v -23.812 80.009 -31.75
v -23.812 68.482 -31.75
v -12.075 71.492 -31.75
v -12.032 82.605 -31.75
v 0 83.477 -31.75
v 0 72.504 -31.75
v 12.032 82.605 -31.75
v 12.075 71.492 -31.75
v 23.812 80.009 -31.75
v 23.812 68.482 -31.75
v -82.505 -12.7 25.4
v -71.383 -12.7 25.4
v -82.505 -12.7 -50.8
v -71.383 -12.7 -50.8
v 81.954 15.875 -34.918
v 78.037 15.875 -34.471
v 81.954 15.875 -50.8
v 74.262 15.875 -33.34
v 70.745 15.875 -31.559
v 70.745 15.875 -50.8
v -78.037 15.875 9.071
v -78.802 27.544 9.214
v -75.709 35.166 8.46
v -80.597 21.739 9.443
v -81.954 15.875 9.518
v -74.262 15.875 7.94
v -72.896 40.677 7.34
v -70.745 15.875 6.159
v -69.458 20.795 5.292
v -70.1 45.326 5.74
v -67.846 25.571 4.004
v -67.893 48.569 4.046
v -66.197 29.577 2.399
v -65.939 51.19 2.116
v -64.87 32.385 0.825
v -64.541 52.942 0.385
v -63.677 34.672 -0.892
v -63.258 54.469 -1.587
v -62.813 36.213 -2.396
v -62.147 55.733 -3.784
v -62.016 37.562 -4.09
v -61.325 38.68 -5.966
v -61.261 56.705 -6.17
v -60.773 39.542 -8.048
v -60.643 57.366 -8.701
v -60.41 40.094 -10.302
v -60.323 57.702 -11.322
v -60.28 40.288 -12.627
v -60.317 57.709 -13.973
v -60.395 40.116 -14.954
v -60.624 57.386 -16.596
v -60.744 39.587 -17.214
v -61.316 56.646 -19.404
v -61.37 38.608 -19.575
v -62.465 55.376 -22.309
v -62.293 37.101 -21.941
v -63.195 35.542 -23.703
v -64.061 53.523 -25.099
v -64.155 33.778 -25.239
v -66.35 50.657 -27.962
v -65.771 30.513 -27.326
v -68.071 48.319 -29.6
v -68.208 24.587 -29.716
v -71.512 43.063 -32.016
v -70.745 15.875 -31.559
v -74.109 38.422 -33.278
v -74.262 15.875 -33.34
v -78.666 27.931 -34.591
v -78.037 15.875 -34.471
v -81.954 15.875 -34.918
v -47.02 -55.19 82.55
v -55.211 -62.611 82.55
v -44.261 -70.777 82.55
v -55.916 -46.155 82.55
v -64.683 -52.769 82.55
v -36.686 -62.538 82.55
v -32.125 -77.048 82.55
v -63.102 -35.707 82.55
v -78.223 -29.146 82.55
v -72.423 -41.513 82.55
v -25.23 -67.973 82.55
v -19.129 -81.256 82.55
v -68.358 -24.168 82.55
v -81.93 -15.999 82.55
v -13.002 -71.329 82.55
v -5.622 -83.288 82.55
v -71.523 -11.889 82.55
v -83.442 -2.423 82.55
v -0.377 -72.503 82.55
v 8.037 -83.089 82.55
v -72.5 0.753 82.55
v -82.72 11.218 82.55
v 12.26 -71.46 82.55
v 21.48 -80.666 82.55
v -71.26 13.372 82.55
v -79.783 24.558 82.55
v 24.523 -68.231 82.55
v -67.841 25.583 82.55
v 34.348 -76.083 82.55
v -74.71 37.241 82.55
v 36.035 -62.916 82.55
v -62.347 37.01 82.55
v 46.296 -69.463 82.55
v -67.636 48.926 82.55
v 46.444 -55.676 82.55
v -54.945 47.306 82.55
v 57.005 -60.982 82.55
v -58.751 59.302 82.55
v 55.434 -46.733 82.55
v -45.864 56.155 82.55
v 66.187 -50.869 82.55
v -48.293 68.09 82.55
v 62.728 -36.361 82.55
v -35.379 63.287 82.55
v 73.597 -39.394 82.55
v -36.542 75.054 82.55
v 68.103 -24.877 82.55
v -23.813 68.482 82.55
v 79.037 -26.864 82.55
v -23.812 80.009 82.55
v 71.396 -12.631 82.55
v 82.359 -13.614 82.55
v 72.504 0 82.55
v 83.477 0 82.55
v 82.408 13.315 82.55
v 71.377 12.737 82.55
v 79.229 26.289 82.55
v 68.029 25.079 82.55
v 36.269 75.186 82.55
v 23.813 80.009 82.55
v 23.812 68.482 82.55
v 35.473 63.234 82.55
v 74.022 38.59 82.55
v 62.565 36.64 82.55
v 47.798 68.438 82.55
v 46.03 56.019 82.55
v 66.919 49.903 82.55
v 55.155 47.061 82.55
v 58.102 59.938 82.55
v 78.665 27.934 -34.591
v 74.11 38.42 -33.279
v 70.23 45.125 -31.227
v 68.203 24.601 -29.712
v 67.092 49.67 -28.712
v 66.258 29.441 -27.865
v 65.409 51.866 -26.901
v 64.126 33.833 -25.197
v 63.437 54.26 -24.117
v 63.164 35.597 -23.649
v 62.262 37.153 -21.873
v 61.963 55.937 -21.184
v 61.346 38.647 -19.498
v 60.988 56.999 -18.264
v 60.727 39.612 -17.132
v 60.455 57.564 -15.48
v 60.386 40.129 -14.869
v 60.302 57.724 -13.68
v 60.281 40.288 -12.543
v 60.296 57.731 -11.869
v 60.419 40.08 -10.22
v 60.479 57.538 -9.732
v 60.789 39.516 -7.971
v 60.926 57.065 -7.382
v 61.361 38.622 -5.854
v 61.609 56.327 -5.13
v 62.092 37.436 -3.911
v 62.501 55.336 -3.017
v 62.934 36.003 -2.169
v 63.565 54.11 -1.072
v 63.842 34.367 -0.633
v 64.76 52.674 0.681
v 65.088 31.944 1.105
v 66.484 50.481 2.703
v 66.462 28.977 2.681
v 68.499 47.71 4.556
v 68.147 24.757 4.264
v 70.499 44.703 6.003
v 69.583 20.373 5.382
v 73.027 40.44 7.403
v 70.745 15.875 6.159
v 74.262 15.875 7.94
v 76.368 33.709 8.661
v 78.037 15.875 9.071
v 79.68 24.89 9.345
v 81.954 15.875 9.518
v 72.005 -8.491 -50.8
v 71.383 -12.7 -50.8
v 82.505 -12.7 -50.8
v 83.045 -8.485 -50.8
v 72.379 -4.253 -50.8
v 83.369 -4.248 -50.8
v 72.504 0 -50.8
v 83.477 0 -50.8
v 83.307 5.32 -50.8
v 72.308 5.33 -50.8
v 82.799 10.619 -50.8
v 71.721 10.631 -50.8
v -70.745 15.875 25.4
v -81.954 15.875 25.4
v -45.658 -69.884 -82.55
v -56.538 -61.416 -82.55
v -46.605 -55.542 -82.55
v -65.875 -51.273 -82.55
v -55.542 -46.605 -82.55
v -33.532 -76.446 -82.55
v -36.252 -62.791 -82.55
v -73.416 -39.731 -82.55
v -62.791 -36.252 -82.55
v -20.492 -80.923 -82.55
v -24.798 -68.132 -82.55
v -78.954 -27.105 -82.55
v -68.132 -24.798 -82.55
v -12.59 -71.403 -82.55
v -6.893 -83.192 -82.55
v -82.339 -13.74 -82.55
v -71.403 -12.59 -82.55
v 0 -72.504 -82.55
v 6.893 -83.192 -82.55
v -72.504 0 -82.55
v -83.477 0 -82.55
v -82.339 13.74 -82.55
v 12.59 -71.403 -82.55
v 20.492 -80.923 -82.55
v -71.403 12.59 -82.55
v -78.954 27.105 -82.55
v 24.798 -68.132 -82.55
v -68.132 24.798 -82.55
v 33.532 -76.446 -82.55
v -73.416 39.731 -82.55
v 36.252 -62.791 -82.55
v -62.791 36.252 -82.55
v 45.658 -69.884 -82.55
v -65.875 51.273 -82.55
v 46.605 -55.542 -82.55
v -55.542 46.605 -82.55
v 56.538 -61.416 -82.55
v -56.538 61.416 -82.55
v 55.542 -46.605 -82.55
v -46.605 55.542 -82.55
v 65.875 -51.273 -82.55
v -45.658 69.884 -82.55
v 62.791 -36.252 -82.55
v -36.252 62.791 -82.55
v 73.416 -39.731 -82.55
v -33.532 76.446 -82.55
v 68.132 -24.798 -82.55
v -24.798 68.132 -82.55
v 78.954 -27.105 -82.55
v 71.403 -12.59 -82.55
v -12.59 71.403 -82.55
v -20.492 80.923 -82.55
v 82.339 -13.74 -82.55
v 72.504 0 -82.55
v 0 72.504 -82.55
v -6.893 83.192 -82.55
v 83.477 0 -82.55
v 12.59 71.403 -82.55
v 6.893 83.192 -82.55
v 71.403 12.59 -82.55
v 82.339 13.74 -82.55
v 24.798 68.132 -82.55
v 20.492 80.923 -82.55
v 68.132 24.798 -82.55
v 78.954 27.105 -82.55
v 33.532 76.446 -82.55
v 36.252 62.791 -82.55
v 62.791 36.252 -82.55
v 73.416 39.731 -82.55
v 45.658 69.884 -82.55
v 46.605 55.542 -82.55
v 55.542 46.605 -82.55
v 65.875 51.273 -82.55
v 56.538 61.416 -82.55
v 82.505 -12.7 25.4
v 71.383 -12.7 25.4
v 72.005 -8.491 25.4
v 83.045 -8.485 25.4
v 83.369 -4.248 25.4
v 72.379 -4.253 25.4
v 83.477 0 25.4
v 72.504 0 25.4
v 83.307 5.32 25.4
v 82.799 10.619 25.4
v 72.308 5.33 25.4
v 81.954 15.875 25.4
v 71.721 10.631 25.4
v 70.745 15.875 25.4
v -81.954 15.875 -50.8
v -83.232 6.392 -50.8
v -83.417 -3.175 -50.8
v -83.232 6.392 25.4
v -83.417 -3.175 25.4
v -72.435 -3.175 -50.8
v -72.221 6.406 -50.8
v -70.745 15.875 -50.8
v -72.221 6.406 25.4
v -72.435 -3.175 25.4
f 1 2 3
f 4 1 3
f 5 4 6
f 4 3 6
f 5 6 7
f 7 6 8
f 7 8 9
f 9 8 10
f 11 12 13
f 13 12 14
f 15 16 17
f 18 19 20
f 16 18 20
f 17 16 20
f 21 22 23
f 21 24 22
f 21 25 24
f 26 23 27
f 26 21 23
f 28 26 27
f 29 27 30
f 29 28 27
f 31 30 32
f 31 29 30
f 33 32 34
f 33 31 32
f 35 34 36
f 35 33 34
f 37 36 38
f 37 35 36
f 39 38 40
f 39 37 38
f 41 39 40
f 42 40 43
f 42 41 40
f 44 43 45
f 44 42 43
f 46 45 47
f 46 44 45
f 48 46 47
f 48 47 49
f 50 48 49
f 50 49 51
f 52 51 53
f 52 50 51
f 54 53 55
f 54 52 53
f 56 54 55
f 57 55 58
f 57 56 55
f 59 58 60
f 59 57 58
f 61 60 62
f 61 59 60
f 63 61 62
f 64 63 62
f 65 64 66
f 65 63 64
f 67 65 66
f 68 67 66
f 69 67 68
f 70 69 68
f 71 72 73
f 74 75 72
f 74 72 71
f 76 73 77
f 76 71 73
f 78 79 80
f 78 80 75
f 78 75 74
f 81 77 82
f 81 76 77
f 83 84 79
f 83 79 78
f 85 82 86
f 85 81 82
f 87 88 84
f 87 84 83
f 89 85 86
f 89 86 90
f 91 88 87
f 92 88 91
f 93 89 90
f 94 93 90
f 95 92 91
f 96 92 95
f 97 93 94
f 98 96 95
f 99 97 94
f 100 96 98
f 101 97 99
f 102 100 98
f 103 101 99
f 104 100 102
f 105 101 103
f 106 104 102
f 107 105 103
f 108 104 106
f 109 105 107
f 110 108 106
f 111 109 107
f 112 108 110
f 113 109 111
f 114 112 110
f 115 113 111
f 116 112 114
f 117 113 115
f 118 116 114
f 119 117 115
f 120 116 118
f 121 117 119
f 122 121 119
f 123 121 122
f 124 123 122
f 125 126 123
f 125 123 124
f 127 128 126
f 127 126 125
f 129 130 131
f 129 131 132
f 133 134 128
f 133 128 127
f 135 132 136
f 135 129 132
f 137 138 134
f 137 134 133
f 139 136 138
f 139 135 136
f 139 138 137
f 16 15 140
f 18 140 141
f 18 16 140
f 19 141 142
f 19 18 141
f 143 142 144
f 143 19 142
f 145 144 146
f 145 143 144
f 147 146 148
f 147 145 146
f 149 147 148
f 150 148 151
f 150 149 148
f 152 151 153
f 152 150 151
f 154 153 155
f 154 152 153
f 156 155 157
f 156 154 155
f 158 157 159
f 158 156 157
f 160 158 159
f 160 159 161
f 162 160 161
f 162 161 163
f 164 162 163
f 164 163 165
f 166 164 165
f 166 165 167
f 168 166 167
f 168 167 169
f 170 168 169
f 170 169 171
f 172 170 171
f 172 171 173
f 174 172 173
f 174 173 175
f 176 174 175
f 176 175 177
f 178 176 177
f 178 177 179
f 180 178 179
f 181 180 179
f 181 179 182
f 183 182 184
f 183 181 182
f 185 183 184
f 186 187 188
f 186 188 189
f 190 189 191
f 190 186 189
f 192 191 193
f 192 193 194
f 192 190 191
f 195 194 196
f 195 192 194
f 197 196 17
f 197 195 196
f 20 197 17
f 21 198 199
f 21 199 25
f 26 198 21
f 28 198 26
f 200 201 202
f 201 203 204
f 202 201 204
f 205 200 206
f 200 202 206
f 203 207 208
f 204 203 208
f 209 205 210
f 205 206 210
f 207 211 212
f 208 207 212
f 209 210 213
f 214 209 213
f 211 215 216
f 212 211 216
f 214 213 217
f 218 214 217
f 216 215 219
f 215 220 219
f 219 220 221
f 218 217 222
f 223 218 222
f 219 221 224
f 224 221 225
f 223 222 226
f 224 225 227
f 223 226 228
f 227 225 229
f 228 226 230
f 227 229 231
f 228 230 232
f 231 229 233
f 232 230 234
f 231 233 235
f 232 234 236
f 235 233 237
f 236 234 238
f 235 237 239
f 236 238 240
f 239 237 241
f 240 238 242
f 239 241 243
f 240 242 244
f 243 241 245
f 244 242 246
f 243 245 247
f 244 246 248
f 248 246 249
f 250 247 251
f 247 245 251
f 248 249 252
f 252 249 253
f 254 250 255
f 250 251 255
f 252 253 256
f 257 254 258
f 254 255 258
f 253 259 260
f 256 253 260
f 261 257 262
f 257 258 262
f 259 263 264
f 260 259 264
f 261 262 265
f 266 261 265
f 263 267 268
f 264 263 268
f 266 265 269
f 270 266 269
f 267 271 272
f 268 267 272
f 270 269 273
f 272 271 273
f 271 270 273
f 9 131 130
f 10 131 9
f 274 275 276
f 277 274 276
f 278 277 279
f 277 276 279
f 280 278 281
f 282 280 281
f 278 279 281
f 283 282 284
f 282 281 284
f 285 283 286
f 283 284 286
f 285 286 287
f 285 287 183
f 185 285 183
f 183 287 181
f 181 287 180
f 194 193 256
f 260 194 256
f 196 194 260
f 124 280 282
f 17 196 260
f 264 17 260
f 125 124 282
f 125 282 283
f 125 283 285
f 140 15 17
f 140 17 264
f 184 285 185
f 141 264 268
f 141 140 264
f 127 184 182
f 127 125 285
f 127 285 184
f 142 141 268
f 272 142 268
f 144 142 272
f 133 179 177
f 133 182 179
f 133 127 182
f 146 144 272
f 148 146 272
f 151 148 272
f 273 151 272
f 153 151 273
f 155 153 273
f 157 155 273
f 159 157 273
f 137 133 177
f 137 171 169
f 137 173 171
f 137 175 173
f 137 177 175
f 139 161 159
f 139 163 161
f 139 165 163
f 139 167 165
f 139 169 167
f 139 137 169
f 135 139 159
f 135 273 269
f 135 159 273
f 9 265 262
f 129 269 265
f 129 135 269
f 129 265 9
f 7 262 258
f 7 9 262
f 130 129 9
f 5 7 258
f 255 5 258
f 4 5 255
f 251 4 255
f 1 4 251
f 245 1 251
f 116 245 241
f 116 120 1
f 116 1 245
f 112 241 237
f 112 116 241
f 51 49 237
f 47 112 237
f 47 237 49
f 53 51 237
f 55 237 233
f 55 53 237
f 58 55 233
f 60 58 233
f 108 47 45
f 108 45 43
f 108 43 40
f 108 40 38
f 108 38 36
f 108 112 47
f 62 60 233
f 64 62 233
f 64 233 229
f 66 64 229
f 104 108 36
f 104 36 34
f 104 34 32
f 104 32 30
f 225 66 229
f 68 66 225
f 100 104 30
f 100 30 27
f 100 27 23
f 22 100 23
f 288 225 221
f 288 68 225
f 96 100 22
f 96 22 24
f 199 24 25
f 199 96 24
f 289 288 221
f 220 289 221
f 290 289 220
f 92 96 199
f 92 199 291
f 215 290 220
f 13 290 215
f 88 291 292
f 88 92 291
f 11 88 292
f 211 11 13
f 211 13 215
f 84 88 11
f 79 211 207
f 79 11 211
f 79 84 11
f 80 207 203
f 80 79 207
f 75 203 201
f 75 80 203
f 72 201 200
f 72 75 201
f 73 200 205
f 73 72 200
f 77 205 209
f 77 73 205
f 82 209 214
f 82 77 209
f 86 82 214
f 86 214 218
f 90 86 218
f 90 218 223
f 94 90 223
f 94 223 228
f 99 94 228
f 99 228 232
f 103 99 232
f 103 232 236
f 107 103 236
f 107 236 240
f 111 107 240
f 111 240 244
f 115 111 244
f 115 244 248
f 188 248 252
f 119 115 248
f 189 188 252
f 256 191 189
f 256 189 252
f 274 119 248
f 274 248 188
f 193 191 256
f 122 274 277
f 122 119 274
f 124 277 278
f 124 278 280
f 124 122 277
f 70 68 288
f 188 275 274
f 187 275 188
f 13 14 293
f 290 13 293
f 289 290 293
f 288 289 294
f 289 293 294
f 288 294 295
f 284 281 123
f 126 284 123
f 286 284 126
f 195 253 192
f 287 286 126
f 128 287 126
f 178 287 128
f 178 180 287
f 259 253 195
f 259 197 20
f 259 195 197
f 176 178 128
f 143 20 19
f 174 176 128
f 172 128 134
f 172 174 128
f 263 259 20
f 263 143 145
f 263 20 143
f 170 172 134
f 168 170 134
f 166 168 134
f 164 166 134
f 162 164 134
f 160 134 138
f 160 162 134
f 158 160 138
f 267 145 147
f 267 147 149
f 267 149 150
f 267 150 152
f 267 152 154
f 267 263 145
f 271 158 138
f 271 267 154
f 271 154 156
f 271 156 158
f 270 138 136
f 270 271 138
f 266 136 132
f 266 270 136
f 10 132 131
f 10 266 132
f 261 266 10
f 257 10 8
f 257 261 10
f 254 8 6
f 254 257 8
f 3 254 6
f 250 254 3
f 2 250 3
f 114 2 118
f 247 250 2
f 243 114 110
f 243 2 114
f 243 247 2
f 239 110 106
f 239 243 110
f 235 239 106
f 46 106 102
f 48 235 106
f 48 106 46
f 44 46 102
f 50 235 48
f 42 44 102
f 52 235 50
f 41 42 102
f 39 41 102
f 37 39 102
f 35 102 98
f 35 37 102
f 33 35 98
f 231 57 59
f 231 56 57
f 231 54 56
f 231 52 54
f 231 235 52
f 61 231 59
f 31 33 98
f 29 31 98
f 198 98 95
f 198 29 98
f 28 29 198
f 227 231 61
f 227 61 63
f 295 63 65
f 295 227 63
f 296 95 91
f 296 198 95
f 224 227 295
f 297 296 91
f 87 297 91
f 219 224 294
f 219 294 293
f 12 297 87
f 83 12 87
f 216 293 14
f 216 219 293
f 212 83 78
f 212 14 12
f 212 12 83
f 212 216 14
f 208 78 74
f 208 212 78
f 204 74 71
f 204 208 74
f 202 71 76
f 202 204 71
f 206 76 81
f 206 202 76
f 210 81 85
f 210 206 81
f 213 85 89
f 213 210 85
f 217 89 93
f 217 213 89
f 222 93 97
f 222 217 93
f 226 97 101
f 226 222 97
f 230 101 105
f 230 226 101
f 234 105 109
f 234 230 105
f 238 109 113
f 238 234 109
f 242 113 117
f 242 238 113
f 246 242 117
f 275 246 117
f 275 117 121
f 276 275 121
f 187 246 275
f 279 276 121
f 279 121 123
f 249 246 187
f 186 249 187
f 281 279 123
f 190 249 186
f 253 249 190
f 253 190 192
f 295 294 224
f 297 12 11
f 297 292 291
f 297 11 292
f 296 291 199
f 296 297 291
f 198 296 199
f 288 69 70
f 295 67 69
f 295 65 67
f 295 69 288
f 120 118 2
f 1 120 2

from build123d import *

# Parameters (mm, degrees)
SKETCH1_R               = 83.4771
SKETCH1_R_2             = 72.5043
BOSS_EXTRUDE1_DEPTH     = 82.55
SKETCH2_W               = 47.625
SKETCH2_H               = 114.3
CUT_EXTRUDE1_DEPTH      = 84.4771
SKETCH3_W               = 76.2
SKETCH3_H               = 25.4
CUT_EXTRUDE2_DEPTH      = 84.4771
CUT_EXTRUDE2_DEPTH_BACK = 84.4771
SKETCH4_R               = 22.225
CUT_EXTRUDE3_DEPTH      = 97.1771
SKETCH6_W               = 76.2
SKETCH6_H               = 3.175
CUT_EXTRUDE4_DEPTH      = 84.4771001
CUT_EXTRUDE4_DEPTH_BACK = 84.4771001


with BuildPart() as part:
    # Sketch1 → Boss-Extrude1 (new body, symmetric)
    with BuildSketch(Plane.XY):
        Circle(SKETCH1_R)
        Circle(SKETCH1_R_2, mode=Mode.SUBTRACT)
    extrude(amount=BOSS_EXTRUDE1_DEPTH, both=True)

    # Sketch2 → Cut-Extrude1 (cut, through all)
    with BuildSketch(Plane(origin=(0, 0, 0), x_dir=(1, 0, 0), z_dir=(0, 1, 0))):
        with Locations((0, -25.4)):
            Rectangle(SKETCH2_W, SKETCH2_H)
    extrude(amount=CUT_EXTRUDE1_DEPTH, mode=Mode.SUBTRACT)

    # Sketch3 → Cut-Extrude2 (cut, two sides)
    with BuildSketch(Plane(origin=(0, 0, 0), x_dir=(0, 0, -1), z_dir=(1, 0, 0))) as cut_extrude2_sk:
        with Locations((12.7, 0)):
            Rectangle(SKETCH3_W, SKETCH3_H)
    extrude(amount=CUT_EXTRUDE2_DEPTH, mode=Mode.SUBTRACT)
    extrude(cut_extrude2_sk.sketch, amount=-CUT_EXTRUDE2_DEPTH_BACK, mode=Mode.SUBTRACT)

    # Sketch4 → Cut-Extrude3 (cut, through all)
    with BuildSketch(Plane(origin=(0, -12.7, 0), x_dir=(1, 0, 0), z_dir=(0, 1, 0))):
        with Locations((-82.505370882, 12.7)):
            Circle(SKETCH4_R)
        with Locations((82.505370882, 12.7)):
            Circle(SKETCH4_R)
    extrude(amount=CUT_EXTRUDE3_DEPTH, mode=Mode.SUBTRACT)

    # Sketch6 → Cut-Extrude4 (cut, two sides)
    with BuildSketch(Plane(origin=(0, 0, 0), x_dir=(0, 0, -1), z_dir=(1, 0, 0))) as cut_extrude4_sk:
        with Locations((12.7, 14.2875)):
            Rectangle(SKETCH6_W, SKETCH6_H)
    extrude(amount=CUT_EXTRUDE4_DEPTH, mode=Mode.SUBTRACT)
    extrude(cut_extrude4_sk.sketch, amount=-CUT_EXTRUDE4_DEPTH_BACK, mode=Mode.SUBTRACT)


solid = part.part
